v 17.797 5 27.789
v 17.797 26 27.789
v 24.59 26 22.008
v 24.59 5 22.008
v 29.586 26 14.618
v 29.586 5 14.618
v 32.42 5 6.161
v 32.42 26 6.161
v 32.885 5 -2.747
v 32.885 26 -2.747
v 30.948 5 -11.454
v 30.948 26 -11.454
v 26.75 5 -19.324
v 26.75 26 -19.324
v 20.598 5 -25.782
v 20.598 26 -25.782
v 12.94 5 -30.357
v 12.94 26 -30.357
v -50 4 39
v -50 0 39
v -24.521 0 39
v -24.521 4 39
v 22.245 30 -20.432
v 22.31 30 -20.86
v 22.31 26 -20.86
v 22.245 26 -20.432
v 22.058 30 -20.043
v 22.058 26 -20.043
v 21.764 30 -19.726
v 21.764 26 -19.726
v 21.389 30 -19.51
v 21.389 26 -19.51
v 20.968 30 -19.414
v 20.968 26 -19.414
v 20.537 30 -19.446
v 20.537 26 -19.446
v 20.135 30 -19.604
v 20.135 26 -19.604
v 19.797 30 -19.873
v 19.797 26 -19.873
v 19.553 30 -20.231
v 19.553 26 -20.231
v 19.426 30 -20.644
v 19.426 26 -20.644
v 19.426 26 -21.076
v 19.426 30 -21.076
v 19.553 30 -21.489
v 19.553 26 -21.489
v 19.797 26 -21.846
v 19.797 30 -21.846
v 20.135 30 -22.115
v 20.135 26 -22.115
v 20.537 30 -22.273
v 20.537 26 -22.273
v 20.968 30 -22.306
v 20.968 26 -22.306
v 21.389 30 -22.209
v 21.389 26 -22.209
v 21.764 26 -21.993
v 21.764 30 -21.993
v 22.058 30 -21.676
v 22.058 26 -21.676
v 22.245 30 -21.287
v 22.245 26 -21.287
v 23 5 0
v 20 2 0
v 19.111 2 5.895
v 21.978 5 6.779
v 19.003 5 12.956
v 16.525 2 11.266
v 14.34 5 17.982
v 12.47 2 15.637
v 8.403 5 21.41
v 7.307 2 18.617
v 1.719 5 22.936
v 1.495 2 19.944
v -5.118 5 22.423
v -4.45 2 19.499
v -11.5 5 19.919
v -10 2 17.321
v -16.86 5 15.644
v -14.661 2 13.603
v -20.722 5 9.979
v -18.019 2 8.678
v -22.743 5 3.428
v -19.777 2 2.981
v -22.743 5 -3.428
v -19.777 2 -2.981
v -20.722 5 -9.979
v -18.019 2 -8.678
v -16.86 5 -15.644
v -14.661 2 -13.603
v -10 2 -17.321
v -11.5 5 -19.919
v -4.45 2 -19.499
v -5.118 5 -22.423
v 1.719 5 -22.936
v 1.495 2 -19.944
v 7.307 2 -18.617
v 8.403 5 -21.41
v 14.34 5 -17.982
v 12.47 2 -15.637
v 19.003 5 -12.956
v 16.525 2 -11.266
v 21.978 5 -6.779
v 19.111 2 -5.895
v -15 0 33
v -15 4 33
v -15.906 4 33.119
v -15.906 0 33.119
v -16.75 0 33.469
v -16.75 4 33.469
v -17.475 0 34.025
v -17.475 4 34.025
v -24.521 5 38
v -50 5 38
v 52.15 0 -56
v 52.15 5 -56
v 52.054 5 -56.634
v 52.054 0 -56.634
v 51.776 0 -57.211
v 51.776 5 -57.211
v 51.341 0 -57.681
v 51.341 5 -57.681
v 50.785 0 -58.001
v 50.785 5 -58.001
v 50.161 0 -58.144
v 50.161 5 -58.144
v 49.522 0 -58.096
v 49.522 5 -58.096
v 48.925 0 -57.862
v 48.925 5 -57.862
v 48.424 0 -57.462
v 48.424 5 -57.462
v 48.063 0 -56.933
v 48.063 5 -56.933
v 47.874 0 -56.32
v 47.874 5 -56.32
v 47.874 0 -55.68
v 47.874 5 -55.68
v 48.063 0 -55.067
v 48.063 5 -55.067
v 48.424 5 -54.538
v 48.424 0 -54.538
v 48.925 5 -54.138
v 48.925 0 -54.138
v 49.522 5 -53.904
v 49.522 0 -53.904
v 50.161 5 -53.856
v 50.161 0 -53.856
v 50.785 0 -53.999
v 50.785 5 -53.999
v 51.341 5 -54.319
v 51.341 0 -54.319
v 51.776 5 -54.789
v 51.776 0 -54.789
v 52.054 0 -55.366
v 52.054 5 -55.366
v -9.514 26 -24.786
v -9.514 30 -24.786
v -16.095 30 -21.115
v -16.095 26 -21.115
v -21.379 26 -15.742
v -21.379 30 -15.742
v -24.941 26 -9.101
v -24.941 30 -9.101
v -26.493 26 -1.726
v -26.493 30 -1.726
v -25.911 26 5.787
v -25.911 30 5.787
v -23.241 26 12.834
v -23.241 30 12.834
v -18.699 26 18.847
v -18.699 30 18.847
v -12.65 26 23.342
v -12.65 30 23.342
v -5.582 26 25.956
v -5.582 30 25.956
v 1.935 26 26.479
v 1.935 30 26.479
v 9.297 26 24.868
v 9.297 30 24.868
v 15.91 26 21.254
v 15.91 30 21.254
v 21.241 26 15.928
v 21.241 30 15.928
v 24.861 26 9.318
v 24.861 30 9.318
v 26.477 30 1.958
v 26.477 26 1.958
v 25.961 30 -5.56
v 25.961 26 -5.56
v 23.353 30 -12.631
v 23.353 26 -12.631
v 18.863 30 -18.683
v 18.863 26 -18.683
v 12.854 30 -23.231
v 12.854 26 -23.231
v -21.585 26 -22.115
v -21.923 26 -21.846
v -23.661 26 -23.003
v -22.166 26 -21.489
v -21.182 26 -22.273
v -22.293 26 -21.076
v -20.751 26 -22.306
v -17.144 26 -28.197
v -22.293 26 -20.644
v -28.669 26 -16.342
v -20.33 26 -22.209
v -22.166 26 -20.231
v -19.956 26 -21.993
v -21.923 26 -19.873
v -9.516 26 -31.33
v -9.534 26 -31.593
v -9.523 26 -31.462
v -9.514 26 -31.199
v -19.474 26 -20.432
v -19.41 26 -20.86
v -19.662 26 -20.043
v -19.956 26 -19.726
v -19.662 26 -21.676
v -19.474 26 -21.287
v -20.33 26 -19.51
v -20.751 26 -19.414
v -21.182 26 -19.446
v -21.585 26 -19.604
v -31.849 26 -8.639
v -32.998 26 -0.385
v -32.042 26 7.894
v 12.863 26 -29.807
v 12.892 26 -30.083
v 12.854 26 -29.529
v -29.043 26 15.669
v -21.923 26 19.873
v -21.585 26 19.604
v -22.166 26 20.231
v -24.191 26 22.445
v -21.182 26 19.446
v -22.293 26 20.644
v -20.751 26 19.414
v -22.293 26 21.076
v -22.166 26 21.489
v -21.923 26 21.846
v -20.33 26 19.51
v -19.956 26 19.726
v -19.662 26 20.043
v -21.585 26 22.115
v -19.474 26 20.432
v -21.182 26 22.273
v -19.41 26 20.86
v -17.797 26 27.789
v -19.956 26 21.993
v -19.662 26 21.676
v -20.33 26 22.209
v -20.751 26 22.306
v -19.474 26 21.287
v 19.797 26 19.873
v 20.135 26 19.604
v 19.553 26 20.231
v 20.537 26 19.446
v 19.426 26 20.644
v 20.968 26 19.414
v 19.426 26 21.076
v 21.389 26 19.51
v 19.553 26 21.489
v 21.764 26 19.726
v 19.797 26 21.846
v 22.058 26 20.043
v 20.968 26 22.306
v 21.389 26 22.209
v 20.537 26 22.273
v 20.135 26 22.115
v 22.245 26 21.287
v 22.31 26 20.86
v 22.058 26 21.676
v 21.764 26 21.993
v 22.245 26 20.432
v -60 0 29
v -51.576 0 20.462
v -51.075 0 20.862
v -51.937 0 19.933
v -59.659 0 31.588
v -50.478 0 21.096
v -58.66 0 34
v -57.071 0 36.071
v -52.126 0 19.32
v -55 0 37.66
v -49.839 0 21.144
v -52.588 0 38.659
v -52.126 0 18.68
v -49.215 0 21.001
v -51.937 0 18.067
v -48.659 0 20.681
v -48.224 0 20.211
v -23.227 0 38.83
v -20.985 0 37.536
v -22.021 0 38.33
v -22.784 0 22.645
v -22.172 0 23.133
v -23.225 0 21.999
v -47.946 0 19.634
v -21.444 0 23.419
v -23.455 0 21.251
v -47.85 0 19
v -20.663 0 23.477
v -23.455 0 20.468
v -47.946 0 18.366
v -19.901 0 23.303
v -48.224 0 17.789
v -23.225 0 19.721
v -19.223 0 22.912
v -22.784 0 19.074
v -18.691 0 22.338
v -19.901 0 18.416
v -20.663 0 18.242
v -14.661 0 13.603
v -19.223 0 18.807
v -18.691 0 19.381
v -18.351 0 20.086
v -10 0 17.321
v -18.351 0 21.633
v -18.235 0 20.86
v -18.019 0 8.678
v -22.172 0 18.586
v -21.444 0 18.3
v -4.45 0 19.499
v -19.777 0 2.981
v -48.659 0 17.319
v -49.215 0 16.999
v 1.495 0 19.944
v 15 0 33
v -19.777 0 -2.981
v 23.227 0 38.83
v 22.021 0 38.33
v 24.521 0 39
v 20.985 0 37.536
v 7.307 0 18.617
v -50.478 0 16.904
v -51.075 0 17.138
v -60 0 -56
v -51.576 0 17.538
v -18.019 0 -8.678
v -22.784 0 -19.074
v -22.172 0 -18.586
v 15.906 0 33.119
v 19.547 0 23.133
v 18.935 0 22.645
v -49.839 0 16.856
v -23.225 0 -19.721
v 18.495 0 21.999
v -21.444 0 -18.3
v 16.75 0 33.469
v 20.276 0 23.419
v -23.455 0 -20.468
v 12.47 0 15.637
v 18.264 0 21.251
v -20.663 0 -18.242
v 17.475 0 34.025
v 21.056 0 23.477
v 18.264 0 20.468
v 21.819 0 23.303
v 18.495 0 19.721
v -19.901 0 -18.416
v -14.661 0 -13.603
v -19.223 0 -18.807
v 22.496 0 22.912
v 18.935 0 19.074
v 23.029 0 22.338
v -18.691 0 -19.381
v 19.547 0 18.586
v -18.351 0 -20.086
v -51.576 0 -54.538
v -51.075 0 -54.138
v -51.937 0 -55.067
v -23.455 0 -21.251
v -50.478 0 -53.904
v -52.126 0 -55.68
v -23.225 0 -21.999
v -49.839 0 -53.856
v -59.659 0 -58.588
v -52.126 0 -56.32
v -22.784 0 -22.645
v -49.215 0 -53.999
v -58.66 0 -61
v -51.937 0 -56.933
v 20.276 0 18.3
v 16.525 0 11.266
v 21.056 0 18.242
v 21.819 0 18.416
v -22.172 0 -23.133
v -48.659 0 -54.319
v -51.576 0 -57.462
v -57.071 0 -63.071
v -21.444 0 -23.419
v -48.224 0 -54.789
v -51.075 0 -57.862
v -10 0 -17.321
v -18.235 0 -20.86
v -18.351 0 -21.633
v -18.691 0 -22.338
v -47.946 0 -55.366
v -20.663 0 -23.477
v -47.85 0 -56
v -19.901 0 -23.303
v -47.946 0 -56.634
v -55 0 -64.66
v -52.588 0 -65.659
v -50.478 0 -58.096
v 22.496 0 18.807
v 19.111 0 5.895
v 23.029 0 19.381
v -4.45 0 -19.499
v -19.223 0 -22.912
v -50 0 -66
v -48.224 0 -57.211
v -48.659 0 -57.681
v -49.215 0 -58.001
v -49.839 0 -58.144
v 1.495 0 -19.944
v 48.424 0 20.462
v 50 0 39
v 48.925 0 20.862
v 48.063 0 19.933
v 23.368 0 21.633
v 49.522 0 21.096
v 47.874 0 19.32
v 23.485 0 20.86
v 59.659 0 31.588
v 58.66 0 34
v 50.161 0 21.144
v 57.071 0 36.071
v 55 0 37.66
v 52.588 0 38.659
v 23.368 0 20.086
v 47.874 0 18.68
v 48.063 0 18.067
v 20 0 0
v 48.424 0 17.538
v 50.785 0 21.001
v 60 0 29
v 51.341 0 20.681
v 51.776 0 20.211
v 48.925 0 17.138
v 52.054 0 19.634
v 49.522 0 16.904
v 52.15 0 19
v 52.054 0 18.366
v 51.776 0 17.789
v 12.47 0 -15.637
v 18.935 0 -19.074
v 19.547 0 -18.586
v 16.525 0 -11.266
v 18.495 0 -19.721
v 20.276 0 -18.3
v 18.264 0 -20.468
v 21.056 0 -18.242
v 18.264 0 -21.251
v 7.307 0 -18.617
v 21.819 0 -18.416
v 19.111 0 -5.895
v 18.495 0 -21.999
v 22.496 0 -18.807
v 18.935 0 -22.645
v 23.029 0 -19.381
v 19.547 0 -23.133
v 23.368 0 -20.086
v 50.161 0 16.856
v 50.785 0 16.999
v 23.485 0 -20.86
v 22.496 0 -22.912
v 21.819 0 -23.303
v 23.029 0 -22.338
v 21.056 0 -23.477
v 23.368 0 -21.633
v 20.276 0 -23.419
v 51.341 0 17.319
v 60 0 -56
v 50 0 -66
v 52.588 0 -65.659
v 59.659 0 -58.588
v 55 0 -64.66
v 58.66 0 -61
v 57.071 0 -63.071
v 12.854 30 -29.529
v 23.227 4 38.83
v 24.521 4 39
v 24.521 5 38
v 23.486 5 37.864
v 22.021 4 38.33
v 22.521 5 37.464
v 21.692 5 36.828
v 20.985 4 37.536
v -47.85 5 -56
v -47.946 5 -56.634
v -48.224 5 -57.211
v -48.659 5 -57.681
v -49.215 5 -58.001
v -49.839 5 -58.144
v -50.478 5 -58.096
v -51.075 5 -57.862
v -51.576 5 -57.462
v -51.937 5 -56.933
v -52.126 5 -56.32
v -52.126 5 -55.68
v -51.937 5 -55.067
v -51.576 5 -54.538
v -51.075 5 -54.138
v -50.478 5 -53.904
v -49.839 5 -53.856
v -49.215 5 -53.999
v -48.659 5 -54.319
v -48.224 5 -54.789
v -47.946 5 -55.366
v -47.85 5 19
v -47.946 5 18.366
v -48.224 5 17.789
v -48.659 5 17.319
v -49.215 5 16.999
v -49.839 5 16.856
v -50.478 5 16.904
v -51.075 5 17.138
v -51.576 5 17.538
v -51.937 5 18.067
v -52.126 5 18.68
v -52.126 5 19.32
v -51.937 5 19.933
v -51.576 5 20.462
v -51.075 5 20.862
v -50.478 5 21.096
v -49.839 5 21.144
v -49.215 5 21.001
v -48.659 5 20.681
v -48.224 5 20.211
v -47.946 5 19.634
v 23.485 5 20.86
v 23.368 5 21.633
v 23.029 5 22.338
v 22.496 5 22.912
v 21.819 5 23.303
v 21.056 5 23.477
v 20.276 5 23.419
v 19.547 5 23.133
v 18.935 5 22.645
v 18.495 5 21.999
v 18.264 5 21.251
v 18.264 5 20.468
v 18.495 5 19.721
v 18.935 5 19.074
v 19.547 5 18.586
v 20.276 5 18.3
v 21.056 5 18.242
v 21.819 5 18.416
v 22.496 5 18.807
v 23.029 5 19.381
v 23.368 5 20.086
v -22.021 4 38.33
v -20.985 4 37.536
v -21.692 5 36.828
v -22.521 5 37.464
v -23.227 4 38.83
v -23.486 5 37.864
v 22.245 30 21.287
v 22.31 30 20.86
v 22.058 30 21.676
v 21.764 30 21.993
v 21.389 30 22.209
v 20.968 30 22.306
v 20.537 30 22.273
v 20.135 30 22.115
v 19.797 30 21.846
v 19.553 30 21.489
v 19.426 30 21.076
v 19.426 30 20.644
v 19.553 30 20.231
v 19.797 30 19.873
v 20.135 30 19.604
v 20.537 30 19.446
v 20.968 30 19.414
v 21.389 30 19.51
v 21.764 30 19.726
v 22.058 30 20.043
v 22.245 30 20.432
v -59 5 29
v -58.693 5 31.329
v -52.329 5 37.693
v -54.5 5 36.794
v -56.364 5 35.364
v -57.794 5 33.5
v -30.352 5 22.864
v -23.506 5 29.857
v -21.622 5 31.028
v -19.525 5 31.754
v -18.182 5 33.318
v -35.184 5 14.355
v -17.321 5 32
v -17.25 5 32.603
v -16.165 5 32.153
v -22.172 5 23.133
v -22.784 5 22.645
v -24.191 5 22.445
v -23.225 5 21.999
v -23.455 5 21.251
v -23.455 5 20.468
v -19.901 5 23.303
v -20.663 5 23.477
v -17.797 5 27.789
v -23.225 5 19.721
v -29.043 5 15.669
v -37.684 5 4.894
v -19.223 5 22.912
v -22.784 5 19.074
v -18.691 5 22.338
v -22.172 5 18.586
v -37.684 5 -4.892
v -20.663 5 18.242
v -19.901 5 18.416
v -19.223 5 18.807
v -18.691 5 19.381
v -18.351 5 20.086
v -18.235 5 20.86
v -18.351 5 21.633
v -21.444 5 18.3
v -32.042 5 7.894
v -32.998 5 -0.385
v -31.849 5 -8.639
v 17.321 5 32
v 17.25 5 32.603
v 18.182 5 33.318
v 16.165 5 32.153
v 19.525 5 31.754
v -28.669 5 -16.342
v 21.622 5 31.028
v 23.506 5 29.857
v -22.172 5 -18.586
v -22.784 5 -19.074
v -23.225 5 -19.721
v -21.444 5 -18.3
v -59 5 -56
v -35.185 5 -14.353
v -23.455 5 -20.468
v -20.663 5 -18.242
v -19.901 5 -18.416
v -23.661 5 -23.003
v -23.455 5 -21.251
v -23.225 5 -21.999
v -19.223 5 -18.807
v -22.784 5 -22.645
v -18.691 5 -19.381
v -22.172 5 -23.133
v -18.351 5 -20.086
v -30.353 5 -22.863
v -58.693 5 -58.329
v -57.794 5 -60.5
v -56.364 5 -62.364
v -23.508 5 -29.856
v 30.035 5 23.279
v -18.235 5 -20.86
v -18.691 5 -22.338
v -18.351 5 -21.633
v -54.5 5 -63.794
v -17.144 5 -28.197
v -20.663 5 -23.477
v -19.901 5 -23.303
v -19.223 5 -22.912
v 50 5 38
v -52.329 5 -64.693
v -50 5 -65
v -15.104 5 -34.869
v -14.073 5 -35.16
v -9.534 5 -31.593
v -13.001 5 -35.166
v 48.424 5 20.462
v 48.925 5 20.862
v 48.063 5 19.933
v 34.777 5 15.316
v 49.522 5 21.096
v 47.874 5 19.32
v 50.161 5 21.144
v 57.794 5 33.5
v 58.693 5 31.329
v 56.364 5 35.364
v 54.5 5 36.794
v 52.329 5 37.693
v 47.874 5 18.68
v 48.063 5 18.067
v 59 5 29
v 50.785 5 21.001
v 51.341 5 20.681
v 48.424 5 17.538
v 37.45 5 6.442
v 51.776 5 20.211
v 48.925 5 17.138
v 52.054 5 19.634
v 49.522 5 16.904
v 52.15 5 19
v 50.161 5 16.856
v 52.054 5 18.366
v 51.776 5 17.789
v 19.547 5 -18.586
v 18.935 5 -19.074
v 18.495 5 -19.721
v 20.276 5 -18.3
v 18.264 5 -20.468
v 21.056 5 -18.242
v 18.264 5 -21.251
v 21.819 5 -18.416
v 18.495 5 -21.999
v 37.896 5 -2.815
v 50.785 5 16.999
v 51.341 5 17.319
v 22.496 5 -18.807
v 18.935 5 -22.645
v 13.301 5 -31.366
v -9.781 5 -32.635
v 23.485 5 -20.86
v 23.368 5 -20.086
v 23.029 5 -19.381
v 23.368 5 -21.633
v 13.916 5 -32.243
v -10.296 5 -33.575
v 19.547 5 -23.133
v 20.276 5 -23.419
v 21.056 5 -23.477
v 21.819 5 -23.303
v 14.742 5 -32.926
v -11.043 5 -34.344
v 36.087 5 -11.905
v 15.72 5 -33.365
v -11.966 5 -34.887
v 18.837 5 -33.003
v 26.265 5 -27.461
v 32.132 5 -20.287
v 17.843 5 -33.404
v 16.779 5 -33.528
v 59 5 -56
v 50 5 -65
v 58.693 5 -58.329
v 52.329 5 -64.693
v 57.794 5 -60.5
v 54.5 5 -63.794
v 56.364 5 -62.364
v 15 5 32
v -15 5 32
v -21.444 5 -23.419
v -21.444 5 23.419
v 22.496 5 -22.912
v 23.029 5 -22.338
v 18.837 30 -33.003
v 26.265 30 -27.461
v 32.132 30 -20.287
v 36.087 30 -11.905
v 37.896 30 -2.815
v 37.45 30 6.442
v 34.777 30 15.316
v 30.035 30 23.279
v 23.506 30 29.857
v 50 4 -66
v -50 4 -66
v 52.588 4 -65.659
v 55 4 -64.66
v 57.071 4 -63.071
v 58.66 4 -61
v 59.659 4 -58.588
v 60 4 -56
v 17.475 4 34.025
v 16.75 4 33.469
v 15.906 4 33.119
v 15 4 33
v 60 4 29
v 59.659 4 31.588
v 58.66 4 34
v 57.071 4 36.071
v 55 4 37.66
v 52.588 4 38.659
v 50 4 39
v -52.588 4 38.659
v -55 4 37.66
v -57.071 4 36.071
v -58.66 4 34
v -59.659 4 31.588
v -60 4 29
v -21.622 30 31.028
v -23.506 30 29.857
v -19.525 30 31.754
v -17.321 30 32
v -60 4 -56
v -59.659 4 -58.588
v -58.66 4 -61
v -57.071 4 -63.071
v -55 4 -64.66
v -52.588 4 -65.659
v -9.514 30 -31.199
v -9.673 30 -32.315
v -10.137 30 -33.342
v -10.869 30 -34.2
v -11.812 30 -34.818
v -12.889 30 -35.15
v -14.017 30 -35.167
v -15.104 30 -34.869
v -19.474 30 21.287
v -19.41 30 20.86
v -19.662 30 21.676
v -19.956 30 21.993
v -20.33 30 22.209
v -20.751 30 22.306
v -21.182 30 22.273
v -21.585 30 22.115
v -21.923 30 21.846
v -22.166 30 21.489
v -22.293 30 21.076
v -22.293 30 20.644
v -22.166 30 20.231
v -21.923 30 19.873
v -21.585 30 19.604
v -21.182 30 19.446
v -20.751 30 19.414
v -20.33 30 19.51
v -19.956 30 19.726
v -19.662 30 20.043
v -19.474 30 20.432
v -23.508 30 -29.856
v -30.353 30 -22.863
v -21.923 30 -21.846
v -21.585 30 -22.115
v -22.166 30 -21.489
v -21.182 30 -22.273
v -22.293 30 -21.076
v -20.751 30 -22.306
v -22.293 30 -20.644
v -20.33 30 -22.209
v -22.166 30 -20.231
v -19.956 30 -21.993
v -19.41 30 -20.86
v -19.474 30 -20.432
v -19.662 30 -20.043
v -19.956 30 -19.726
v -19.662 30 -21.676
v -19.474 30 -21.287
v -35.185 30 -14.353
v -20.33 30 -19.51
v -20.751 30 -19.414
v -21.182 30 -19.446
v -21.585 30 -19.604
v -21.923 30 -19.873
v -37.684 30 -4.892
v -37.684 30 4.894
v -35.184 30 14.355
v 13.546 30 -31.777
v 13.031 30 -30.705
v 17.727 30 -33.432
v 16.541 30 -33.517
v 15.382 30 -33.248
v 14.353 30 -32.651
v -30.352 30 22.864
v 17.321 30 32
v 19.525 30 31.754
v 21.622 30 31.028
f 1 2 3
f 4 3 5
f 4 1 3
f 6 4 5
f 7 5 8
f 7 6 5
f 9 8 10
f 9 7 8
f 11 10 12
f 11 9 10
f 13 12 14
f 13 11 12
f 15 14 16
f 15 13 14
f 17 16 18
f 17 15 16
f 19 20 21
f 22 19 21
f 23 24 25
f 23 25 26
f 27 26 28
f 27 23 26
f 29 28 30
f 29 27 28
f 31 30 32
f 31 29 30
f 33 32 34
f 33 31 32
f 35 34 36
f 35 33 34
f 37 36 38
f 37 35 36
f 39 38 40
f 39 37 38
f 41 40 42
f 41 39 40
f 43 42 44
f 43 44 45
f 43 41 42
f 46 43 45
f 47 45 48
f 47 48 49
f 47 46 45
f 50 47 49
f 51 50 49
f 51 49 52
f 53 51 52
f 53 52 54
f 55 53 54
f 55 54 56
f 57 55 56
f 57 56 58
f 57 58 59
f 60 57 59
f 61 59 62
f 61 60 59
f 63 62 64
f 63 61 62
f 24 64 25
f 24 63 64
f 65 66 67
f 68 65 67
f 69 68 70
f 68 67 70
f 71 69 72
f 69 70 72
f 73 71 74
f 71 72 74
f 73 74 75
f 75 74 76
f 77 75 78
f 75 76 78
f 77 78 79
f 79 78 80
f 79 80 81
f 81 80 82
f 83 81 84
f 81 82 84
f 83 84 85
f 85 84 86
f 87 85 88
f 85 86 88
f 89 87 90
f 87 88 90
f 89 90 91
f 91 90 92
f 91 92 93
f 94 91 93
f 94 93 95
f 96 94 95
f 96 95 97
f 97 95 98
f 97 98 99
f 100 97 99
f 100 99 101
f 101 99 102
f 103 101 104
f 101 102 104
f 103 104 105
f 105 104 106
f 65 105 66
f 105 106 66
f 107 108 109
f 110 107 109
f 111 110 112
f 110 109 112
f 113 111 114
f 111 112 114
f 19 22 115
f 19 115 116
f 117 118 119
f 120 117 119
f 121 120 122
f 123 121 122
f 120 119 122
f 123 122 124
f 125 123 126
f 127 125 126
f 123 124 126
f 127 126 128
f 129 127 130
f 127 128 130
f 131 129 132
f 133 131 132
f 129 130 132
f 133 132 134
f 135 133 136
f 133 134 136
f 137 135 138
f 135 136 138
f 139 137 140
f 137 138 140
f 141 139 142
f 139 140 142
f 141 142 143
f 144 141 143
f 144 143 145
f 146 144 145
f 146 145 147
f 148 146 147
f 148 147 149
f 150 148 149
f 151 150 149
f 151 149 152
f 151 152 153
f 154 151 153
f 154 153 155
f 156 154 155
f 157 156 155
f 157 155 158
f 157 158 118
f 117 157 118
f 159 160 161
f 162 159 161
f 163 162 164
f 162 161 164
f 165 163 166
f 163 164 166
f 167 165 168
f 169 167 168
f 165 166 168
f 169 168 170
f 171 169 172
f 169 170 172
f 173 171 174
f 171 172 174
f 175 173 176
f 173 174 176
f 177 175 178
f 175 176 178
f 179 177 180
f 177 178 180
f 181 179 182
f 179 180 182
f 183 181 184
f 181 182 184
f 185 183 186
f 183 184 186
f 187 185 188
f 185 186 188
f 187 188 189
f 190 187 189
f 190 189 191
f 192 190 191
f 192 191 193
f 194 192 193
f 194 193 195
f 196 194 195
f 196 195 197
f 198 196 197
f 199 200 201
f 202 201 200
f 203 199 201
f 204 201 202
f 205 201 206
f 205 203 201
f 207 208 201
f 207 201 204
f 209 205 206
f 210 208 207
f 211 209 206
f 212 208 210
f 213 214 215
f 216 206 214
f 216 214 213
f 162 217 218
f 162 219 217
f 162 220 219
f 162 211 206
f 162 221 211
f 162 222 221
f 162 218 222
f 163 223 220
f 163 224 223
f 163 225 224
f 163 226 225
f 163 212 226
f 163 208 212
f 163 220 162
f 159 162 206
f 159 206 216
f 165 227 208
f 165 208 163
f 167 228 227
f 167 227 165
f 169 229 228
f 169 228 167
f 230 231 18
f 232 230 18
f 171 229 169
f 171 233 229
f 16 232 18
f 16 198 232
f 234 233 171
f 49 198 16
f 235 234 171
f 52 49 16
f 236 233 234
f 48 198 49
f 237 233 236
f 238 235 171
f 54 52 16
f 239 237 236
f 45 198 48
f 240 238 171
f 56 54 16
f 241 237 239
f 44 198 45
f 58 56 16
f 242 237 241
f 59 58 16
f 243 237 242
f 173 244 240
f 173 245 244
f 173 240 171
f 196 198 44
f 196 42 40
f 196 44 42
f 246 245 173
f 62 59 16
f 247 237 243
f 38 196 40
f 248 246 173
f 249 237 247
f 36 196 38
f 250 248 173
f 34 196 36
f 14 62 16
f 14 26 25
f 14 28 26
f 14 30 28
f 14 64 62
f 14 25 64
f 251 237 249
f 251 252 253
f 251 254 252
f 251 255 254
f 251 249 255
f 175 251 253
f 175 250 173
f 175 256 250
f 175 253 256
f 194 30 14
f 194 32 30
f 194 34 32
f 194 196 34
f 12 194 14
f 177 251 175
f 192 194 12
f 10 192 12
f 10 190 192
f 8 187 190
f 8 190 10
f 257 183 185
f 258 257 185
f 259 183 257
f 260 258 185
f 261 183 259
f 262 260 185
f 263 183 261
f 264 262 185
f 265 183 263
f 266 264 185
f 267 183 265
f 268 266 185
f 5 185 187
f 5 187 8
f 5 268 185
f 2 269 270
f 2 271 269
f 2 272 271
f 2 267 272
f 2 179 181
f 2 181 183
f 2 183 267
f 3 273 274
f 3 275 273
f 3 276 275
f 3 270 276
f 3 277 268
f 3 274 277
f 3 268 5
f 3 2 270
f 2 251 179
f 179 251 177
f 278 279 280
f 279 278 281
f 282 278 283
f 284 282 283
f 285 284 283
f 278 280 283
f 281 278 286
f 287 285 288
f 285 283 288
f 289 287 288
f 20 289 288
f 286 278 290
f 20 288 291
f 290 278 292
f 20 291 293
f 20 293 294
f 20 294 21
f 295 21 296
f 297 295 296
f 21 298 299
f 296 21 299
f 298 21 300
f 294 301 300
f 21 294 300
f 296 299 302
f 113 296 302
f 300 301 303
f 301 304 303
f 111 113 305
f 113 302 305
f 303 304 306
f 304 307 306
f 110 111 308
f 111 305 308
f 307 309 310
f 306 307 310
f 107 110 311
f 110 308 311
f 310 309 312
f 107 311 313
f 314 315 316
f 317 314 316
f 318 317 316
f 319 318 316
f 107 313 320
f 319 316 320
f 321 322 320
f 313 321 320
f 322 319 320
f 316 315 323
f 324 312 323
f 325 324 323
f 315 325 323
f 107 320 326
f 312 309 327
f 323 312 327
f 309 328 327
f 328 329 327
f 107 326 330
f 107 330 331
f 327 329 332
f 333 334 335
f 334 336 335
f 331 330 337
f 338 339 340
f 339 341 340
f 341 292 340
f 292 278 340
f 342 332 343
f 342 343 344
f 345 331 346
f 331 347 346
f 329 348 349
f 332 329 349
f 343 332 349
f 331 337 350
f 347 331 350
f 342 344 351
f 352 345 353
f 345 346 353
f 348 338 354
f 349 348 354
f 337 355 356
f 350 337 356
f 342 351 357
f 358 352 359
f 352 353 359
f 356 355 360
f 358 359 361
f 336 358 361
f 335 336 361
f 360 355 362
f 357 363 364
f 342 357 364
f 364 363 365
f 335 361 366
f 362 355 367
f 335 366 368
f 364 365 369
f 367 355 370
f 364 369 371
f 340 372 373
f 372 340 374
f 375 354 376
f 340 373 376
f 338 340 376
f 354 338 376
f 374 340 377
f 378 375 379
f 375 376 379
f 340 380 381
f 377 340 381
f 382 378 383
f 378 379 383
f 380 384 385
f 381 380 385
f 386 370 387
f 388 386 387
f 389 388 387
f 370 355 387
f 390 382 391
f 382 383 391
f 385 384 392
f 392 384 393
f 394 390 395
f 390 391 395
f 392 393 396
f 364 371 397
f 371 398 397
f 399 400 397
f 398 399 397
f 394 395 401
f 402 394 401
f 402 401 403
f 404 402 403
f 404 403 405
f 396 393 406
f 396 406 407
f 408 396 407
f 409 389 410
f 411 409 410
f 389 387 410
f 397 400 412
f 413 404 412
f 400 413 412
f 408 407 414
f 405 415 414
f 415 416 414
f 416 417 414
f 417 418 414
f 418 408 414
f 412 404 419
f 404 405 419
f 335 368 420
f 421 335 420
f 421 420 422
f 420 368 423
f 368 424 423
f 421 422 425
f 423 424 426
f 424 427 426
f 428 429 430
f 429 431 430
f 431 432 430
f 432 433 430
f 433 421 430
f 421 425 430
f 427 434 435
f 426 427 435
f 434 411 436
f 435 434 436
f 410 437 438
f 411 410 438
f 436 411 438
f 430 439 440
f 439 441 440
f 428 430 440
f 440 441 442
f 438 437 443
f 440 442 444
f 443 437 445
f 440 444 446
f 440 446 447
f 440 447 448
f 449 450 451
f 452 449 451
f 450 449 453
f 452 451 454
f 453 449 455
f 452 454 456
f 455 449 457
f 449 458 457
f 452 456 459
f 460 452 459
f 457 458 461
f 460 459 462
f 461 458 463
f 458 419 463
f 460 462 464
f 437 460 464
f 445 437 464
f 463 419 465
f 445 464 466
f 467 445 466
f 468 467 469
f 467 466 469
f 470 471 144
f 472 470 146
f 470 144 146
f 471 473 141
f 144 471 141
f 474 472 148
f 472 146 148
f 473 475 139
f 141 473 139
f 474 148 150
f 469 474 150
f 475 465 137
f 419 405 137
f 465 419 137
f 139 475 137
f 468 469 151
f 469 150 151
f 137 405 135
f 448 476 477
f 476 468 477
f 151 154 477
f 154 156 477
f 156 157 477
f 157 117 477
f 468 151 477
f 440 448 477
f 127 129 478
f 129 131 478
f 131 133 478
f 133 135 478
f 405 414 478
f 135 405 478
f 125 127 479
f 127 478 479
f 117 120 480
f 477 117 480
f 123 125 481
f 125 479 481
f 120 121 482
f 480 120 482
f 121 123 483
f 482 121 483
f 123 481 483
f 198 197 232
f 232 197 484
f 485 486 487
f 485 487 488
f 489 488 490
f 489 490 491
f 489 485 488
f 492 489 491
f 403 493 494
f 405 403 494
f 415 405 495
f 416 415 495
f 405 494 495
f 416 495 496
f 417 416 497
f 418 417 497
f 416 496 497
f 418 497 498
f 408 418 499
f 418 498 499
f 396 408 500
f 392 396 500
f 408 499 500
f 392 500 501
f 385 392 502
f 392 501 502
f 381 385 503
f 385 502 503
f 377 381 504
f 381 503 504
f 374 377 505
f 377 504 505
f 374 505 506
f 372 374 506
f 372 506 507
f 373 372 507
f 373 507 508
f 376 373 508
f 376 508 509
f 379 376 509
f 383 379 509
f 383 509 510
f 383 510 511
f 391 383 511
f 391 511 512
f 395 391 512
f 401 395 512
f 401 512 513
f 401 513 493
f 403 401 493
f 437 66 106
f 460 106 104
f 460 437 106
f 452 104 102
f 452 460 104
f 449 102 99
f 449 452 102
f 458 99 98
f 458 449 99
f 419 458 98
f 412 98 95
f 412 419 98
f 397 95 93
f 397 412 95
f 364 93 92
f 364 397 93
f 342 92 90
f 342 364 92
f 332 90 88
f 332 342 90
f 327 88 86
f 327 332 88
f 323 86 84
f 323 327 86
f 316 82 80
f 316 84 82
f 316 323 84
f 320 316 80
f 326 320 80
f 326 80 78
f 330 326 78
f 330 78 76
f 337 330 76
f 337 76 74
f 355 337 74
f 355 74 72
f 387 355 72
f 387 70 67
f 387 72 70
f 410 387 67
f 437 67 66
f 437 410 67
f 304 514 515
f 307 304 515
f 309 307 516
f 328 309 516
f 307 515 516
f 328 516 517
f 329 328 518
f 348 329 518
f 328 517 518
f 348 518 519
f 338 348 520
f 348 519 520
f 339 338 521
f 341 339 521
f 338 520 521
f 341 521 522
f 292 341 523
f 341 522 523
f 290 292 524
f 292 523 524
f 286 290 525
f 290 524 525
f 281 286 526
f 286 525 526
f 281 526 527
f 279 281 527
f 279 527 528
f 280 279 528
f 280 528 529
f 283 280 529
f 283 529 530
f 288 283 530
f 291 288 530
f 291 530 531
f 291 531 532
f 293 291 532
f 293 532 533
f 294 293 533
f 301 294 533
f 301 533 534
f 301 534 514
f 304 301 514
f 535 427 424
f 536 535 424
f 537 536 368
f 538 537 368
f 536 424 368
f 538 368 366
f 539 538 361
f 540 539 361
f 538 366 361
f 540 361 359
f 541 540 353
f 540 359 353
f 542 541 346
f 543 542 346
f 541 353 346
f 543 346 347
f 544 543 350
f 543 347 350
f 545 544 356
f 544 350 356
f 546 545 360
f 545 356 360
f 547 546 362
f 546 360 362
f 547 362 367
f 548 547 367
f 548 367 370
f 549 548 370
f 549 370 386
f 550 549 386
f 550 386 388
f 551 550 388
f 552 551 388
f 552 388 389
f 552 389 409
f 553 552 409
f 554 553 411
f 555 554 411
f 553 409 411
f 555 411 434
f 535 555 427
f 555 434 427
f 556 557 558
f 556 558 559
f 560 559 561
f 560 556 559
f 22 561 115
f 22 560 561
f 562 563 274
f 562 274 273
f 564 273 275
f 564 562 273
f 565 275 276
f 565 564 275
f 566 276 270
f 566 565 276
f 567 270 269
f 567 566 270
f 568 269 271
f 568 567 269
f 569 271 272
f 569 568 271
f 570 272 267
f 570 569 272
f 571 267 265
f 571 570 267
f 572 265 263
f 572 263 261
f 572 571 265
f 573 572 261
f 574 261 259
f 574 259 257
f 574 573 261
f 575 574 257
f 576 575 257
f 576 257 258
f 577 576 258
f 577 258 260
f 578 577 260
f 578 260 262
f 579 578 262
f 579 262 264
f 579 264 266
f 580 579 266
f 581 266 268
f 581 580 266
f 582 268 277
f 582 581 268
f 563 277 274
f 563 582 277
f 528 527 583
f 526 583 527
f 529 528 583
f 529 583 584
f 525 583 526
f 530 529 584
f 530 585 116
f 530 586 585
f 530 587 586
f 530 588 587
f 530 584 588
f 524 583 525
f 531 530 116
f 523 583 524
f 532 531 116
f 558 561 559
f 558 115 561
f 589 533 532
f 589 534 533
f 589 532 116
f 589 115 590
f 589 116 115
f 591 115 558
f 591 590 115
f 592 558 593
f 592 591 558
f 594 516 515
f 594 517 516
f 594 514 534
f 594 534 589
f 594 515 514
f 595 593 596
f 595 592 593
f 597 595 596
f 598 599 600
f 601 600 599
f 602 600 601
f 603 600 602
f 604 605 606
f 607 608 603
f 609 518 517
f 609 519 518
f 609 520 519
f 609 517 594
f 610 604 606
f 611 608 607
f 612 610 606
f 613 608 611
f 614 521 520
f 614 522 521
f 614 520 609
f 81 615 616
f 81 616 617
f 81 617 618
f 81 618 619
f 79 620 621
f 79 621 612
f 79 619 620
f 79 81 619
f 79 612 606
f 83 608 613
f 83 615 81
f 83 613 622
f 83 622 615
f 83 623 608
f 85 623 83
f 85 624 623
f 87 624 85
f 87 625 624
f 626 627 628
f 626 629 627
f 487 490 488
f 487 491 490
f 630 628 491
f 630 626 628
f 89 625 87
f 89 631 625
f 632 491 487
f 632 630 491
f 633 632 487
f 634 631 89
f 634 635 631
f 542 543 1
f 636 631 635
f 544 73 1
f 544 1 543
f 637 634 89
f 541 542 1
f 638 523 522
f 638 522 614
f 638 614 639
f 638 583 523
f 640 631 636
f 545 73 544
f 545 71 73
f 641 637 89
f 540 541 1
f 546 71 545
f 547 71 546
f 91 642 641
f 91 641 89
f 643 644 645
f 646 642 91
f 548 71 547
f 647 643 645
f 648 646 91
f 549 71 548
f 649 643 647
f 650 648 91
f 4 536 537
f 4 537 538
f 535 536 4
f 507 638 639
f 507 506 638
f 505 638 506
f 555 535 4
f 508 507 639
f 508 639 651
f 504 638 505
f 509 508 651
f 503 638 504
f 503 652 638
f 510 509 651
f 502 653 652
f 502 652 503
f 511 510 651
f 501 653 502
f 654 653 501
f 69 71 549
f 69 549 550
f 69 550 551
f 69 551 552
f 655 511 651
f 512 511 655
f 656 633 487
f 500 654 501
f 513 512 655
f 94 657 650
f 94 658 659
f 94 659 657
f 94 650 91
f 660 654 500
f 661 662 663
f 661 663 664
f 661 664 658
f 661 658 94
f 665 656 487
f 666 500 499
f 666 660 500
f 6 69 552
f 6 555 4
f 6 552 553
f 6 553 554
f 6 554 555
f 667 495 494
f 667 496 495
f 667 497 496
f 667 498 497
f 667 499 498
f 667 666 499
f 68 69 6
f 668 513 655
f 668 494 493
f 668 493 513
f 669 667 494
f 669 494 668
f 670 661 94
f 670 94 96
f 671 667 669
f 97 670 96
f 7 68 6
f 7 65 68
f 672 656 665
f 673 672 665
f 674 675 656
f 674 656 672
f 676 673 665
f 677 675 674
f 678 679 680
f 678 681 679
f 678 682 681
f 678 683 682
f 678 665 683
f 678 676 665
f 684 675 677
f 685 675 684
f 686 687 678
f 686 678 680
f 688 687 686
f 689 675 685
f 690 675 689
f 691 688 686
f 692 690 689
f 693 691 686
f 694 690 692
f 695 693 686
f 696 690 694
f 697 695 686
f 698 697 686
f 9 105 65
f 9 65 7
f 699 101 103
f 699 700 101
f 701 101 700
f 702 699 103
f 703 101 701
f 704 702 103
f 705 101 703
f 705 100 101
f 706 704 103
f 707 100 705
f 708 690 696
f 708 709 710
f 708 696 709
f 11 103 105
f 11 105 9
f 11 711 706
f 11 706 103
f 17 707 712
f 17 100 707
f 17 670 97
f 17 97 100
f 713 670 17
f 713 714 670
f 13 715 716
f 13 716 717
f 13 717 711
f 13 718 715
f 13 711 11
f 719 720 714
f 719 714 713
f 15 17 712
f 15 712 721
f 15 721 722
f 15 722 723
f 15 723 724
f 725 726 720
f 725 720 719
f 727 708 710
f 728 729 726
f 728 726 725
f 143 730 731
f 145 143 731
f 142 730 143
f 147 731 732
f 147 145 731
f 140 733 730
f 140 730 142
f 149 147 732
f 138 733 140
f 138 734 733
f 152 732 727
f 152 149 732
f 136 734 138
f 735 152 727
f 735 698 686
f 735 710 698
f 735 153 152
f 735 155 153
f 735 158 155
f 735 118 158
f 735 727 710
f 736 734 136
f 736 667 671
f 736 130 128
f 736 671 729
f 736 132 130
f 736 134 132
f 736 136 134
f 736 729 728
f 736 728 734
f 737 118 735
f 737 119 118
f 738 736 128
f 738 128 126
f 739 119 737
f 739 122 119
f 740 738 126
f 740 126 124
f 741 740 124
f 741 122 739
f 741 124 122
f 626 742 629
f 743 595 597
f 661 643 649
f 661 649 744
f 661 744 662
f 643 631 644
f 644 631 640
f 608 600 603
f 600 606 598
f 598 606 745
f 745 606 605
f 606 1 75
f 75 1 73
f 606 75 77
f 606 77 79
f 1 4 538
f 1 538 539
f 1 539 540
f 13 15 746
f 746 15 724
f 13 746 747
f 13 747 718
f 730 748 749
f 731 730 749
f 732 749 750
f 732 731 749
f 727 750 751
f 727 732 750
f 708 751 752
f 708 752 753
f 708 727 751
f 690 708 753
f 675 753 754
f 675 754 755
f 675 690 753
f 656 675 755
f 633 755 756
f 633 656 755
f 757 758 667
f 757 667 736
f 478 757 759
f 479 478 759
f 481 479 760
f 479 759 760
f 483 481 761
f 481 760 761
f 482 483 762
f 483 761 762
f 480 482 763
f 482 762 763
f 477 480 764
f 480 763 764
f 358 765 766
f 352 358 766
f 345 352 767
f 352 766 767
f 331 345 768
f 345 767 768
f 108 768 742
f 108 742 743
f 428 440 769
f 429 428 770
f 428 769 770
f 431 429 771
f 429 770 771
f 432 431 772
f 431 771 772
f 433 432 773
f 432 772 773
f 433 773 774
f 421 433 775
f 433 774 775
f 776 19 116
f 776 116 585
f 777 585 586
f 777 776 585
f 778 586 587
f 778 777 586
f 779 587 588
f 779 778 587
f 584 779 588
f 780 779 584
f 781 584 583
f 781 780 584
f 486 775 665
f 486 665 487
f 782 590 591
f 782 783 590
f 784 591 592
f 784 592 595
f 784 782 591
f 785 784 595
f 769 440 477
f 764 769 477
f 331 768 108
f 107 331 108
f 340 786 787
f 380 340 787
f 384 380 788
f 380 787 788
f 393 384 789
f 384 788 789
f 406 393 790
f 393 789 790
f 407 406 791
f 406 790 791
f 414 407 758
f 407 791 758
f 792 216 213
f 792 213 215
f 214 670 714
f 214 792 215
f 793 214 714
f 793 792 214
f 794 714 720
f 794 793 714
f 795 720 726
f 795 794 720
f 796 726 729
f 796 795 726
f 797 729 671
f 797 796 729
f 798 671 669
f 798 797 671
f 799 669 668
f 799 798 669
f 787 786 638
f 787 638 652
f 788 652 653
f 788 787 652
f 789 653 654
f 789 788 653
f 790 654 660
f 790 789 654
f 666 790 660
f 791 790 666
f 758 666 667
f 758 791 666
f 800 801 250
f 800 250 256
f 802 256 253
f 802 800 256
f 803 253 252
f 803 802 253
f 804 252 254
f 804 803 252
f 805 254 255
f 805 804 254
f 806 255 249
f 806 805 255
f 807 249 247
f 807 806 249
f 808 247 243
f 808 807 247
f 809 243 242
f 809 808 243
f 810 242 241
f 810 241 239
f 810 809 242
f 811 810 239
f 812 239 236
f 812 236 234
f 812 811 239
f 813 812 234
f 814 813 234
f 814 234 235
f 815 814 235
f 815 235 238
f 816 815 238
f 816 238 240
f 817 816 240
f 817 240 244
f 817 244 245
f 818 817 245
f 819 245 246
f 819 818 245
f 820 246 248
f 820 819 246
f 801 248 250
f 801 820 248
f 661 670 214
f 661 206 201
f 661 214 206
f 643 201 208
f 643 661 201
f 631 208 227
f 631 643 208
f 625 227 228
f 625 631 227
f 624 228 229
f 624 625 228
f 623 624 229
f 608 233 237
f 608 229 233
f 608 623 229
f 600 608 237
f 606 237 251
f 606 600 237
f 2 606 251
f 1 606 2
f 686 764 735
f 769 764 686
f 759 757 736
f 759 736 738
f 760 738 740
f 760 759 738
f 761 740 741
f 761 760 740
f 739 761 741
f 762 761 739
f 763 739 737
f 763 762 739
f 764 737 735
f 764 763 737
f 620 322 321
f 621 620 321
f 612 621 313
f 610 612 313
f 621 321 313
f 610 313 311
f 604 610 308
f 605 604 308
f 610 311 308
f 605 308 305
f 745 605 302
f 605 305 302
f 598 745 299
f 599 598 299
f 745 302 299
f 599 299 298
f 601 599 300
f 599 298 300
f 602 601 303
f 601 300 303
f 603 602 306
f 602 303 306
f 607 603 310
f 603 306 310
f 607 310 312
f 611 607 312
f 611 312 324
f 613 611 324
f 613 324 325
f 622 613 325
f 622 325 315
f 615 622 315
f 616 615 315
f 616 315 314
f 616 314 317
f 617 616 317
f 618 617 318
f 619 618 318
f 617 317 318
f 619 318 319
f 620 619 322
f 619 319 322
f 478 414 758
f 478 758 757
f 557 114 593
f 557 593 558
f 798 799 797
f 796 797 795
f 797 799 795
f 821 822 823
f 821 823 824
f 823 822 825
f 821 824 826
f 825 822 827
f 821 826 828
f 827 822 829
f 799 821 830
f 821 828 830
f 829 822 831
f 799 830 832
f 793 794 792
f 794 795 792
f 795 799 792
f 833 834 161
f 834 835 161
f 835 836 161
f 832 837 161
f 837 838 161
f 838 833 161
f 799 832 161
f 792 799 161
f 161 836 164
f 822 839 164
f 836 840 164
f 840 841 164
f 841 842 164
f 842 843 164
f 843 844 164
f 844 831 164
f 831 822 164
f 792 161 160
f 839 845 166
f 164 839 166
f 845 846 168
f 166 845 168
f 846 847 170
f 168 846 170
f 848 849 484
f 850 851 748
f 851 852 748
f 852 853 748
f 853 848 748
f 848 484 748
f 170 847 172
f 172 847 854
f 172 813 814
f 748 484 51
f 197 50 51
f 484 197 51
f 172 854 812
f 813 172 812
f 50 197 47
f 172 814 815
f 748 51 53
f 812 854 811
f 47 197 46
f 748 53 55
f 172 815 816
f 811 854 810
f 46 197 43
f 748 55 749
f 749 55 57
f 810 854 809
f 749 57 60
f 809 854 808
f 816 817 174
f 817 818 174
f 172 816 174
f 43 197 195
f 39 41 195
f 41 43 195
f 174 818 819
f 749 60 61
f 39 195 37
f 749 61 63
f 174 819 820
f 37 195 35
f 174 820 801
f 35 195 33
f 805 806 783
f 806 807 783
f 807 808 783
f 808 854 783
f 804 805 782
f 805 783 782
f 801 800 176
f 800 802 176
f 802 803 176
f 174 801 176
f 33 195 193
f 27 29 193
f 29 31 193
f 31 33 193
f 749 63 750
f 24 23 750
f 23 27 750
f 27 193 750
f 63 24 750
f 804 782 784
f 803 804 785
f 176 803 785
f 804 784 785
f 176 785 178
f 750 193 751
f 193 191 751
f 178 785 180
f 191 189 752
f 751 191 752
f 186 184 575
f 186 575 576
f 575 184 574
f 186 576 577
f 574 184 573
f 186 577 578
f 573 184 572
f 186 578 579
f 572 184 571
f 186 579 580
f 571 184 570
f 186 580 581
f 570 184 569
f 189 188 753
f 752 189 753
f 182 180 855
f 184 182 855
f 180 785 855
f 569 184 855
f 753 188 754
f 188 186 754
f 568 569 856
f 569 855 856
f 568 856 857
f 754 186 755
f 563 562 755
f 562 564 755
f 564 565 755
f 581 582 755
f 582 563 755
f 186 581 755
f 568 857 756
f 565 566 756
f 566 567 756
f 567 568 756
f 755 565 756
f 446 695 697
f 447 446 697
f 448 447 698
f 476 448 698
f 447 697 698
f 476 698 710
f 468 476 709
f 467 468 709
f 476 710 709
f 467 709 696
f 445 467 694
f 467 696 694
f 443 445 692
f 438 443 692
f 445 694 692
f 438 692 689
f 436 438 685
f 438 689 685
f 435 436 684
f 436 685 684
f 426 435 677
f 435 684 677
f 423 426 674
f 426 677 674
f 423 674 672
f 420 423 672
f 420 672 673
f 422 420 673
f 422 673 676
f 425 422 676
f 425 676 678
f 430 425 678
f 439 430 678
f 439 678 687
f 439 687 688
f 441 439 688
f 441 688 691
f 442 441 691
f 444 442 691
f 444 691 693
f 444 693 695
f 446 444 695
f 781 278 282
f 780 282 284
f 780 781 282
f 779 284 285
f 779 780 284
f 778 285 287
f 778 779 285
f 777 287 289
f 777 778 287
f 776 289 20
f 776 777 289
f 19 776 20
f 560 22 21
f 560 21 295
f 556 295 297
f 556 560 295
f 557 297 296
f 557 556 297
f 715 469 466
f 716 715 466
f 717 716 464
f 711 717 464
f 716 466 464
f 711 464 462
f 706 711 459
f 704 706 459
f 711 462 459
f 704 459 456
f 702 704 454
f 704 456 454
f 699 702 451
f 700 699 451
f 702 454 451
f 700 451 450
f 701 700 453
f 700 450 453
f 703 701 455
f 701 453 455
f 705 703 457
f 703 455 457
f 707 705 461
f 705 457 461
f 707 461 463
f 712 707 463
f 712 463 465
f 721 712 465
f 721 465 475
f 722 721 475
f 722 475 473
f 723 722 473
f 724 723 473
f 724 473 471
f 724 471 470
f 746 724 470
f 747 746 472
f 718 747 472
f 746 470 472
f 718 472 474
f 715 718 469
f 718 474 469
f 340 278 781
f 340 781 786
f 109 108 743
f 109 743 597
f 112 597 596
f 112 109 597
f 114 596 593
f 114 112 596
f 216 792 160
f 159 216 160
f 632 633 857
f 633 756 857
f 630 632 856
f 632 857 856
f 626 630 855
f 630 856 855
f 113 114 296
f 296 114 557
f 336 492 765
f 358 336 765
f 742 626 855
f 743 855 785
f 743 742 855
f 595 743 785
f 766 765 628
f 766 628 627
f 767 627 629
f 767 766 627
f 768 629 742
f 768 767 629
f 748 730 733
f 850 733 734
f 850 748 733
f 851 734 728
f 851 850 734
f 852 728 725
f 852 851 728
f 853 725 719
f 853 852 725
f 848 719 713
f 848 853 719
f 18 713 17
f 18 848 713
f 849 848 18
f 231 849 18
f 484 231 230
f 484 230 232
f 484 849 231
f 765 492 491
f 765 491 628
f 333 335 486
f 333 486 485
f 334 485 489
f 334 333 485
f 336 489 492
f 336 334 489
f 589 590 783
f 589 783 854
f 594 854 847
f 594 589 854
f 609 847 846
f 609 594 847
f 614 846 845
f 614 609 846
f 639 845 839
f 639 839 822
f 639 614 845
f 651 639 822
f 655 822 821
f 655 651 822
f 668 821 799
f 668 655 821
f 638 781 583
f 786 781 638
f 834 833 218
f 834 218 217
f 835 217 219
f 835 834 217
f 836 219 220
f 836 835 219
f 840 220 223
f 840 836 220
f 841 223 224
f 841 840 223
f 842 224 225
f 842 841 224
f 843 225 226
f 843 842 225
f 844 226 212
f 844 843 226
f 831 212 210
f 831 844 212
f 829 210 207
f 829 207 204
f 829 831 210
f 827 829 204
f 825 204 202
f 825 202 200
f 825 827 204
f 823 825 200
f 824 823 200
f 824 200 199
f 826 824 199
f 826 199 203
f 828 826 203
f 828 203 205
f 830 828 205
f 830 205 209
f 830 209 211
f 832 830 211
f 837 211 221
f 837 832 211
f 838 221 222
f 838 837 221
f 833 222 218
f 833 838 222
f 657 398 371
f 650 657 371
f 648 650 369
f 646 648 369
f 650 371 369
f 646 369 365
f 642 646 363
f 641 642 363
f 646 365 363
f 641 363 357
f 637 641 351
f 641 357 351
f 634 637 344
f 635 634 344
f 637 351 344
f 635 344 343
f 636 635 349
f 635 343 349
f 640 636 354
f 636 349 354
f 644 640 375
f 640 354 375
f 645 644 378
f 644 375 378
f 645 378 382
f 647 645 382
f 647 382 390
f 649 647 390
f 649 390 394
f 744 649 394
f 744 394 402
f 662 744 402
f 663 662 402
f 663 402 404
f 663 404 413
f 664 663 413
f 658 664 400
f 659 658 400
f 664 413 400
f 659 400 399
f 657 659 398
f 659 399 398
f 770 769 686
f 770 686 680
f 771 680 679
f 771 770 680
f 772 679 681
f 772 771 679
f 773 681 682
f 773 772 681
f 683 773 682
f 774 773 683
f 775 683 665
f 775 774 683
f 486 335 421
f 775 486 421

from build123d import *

# Parameters (mm, degrees)
SKETCH2_W           = 120
SKETCH2_H           = 105
BOSS_EXTRUDE2_DEPTH = 5
CUT_EXTRUDE7_DEPTH  = 6
FILLET5_R           = 10
SKETCH10_R          = 20
CUT_EXTRUDE9_DEPTH  = 6
CHAMFER3_SIZE       = 3
FILLET6_R           = 5
CHAMFER4_SIZE       = 1
SKETCH11_R          = 2.15
CUT_EXTRUDE10_DEPTH = 6
BOSS_EXTRUDE3_DEPTH = 25
BOSS_EXTRUDE4_START = -25
SKETCH27_3_R        = 1.45
BOSS_EXTRUDE4_DEPTH = 4
SKETCH28_R          = 2.625
CUT_EXTRUDE13_DEPTH = 5
FILLET7_R           = 10
FILLET8_R           = 4


with BuildPart() as part:
    # Sketch2 → Boss-Extrude2 (new body)
    with BuildSketch(Plane(origin=(0, 0, 0), x_dir=(1, 0, 0), z_dir=(0, 1, 0))):
        with Locations((0, 13.5)):
            Rectangle(SKETCH2_W, SKETCH2_H)
    extrude(amount=BOSS_EXTRUDE2_DEPTH)

    # Sketch9 → Cut-Extrude7 (cut, through all)
    with BuildSketch(Plane(origin=(0, 5, 0), x_dir=(1, 0, 0), z_dir=(0, 1, 0))):
        with BuildLine():
            Line((-17.474873734, -34.025126266), (-23.449747468, -40))
            Line((-23.449747468, -40), (23.449747468, -40))
            Line((23.449747468, -40), (17.474873734, -34.025126266))
            ThreePointArc((17.474873734, -34.025126266), (16.339392013, -33.266421636), (15, -33))
            Line((15, -33), (-15, -33))
            ThreePointArc((-15, -33), (-16.339392013, -33.266421636), (-17.474873734, -34.025126266))
        make_face()
    extrude(amount=-CUT_EXTRUDE7_DEPTH, mode=Mode.SUBTRACT)

    # Fillet5
    fillet5_edges = [part.edges().sort_by_distance(p)[0] for p in [
        (-60, 2.5, -66),
        (60, 2.5, -66),
        (60, 2.5, 39),
        (-60, 2.5, 39),
    ]]
    fillet(fillet5_edges, radius=FILLET5_R)

    # Sketch10 → Cut-Extrude9 (cut, through all)
    with BuildSketch(Plane(origin=(0, 0, 0), x_dir=(1, 0, 0), z_dir=(0, 1, 0))):
        Circle(SKETCH10_R)
    extrude(amount=CUT_EXTRUDE9_DEPTH, mode=Mode.SUBTRACT)

    # Chamfer3
    chamfer3_edges = [part.edges().sort_by_distance(p)[0] for p in [
        (-20, 5, 0),
    ]]
    chamfer(chamfer3_edges, length=CHAMFER3_SIZE)

    # Fillet6
    fillet6_edges = [part.edges().sort_by_distance(p)[0] for p in [
        (22.449747468, 2.5, 39),
        (-22.449747468, 2.5, 39),
    ]]
    fillet(fillet6_edges, radius=FILLET6_R)

    # Chamfer4
    chamfer4_edges = [part.edges().sort_by_distance(p)[0] for p in [
        (16.339392013, 5, 33.266421636),
        (0, 5, 33),
        (-16.339392013, 5, 33.266421636),
        (-19.230077554, 5, 35.780330086),
        (-60, 5, -13.5),
        (0, 5, -66),
        (60, 5, -13.5),
        (-37.26040764, 5, 39),
        (-57.071067812, 5, 36.071067812),
        (57.071067812, 5, 36.071067812),
        (57.071067812, 5, -63.071067812),
        (-57.071067812, 5, -63.071067812),
        (19.230077554, 5, 35.780330086),
        (37.26040764, 5, 39),
        (22.607398118, 5, 38.619397663),
        (-22.607398118, 5, 38.619397663),
    ]]
    chamfer(chamfer4_edges, length=CHAMFER4_SIZE)

    # Sketch11 → Cut-Extrude10 (cut, through all)
    with BuildSketch(Plane(origin=(0, 5, 0), x_dir=(1, 0, 0), z_dir=(0, 1, 0))):
        with Locations((-50, 56)):
            Circle(SKETCH11_R)
        with Locations((50, 56)):
            Circle(SKETCH11_R)
        with Locations((-50, -19)):
            Circle(SKETCH11_R)
        with Locations((50, -19)):
            Circle(SKETCH11_R)
    extrude(amount=-CUT_EXTRUDE10_DEPTH, mode=Mode.SUBTRACT)

    # Sketch27 → Boss-Extrude3 (add)
    with BuildSketch(Plane.XZ.offset(-5)):
        with BuildLine():
            Line((15, 32), (-15, 32))
            Line((-15, 32), (-20.493901532, 32))
            ThreePointArc((-20.493901532, 32), (-37.525010245, -5.989457917), (-9.514215685, -36.789668385))
            Line((-9.514215685, -36.789668385), (-9.514215685, -31.598729403))
            ThreePointArc((-9.514215685, -31.598729403), (-32.683633122, -4.55852234), (-17.797335541, 27.789473684))
            Line((-17.797335541, 27.789473684), (17.797335541, 27.789473684))
            ThreePointArc((17.797335541, 27.789473684), (32.881527048, -2.793775048), (12.853805326, -30.393744235))
            Line((12.853805326, -30.393744235), (12.853805326, -35.760029204))
            ThreePointArc((12.853805326, -35.760029204), (37.760730628, -4.257607592), (20.493901532, 32))
            Line((20.493901532, 32), (15, 32))
        make_face()
    extrude(amount=-BOSS_EXTRUDE3_DEPTH)

    # Sketch27<3> → Boss-Extrude4 (add)
    with BuildSketch(Plane.XZ.offset(-5).offset(BOSS_EXTRUDE4_START)):
        with BuildLine():
            ThreePointArc((-17.797335541, 27.789473684), (-32.683633122, -4.55852234), (-9.514215685, -31.598729403))
            Line((-9.514215685, -31.598729403), (-9.514215685, -24.786250802))
            ThreePointArc((-9.514215685, -24.786250802), (-1.842083043, 26.485566994), (12.853805326, -23.230544926))
            Line((12.853805326, -23.230544926), (12.853805326, -30.393744235))
            ThreePointArc((12.853805326, -30.393744235), (32.881527048, -2.793775048), (17.797335541, 27.789473684))
            Line((17.797335541, 27.789473684), (-17.797335541, 27.789473684))
        make_face()
        with Locations((-20.859650045, -20.859650045)):
            Circle(SKETCH27_3_R, mode=Mode.SUBTRACT)
        with Locations((20.859650045, -20.859650045)):
            Circle(SKETCH27_3_R, mode=Mode.SUBTRACT)
        with Locations((-20.859650045, 20.859650045)):
            Circle(SKETCH27_3_R, mode=Mode.SUBTRACT)
        with Locations((20.859650045, 20.859650045)):
            Circle(SKETCH27_3_R, mode=Mode.SUBTRACT)
    extrude(amount=BOSS_EXTRUDE4_DEPTH)

    # Sketch28 → Cut-Extrude13 (cut)
    with BuildSketch(Plane.XZ):
        with Locations((-20.859650045, 20.859650045)):
            Circle(SKETCH28_R)
        with Locations((20.859650045, 20.859650045)):
            Circle(SKETCH28_R)
        with Locations((20.859650045, -20.859650045)):
            Circle(SKETCH28_R)
        with Locations((-20.859650045, -20.859650045)):
            Circle(SKETCH28_R)
    extrude(amount=-CUT_EXTRUDE13_DEPTH, mode=Mode.SUBTRACT)

    # Fillet7
    fillet7_edges = [part.edges().sort_by_distance(p)[0] for p in [
        (-20.493901532, 17.5, 32),
        (20.493901532, 17.5, 32),
    ]]
    fillet(fillet7_edges, radius=FILLET7_R)

    # Fillet8
    fillet8_edges = [part.edges().sort_by_distance(p)[0] for p in [
        (-9.514215685, 17.5, -36.789668385),
        (12.853805326, 17.5, -35.760029204),
    ]]
    fillet(fillet8_edges, radius=FILLET8_R)


solid = part.part
